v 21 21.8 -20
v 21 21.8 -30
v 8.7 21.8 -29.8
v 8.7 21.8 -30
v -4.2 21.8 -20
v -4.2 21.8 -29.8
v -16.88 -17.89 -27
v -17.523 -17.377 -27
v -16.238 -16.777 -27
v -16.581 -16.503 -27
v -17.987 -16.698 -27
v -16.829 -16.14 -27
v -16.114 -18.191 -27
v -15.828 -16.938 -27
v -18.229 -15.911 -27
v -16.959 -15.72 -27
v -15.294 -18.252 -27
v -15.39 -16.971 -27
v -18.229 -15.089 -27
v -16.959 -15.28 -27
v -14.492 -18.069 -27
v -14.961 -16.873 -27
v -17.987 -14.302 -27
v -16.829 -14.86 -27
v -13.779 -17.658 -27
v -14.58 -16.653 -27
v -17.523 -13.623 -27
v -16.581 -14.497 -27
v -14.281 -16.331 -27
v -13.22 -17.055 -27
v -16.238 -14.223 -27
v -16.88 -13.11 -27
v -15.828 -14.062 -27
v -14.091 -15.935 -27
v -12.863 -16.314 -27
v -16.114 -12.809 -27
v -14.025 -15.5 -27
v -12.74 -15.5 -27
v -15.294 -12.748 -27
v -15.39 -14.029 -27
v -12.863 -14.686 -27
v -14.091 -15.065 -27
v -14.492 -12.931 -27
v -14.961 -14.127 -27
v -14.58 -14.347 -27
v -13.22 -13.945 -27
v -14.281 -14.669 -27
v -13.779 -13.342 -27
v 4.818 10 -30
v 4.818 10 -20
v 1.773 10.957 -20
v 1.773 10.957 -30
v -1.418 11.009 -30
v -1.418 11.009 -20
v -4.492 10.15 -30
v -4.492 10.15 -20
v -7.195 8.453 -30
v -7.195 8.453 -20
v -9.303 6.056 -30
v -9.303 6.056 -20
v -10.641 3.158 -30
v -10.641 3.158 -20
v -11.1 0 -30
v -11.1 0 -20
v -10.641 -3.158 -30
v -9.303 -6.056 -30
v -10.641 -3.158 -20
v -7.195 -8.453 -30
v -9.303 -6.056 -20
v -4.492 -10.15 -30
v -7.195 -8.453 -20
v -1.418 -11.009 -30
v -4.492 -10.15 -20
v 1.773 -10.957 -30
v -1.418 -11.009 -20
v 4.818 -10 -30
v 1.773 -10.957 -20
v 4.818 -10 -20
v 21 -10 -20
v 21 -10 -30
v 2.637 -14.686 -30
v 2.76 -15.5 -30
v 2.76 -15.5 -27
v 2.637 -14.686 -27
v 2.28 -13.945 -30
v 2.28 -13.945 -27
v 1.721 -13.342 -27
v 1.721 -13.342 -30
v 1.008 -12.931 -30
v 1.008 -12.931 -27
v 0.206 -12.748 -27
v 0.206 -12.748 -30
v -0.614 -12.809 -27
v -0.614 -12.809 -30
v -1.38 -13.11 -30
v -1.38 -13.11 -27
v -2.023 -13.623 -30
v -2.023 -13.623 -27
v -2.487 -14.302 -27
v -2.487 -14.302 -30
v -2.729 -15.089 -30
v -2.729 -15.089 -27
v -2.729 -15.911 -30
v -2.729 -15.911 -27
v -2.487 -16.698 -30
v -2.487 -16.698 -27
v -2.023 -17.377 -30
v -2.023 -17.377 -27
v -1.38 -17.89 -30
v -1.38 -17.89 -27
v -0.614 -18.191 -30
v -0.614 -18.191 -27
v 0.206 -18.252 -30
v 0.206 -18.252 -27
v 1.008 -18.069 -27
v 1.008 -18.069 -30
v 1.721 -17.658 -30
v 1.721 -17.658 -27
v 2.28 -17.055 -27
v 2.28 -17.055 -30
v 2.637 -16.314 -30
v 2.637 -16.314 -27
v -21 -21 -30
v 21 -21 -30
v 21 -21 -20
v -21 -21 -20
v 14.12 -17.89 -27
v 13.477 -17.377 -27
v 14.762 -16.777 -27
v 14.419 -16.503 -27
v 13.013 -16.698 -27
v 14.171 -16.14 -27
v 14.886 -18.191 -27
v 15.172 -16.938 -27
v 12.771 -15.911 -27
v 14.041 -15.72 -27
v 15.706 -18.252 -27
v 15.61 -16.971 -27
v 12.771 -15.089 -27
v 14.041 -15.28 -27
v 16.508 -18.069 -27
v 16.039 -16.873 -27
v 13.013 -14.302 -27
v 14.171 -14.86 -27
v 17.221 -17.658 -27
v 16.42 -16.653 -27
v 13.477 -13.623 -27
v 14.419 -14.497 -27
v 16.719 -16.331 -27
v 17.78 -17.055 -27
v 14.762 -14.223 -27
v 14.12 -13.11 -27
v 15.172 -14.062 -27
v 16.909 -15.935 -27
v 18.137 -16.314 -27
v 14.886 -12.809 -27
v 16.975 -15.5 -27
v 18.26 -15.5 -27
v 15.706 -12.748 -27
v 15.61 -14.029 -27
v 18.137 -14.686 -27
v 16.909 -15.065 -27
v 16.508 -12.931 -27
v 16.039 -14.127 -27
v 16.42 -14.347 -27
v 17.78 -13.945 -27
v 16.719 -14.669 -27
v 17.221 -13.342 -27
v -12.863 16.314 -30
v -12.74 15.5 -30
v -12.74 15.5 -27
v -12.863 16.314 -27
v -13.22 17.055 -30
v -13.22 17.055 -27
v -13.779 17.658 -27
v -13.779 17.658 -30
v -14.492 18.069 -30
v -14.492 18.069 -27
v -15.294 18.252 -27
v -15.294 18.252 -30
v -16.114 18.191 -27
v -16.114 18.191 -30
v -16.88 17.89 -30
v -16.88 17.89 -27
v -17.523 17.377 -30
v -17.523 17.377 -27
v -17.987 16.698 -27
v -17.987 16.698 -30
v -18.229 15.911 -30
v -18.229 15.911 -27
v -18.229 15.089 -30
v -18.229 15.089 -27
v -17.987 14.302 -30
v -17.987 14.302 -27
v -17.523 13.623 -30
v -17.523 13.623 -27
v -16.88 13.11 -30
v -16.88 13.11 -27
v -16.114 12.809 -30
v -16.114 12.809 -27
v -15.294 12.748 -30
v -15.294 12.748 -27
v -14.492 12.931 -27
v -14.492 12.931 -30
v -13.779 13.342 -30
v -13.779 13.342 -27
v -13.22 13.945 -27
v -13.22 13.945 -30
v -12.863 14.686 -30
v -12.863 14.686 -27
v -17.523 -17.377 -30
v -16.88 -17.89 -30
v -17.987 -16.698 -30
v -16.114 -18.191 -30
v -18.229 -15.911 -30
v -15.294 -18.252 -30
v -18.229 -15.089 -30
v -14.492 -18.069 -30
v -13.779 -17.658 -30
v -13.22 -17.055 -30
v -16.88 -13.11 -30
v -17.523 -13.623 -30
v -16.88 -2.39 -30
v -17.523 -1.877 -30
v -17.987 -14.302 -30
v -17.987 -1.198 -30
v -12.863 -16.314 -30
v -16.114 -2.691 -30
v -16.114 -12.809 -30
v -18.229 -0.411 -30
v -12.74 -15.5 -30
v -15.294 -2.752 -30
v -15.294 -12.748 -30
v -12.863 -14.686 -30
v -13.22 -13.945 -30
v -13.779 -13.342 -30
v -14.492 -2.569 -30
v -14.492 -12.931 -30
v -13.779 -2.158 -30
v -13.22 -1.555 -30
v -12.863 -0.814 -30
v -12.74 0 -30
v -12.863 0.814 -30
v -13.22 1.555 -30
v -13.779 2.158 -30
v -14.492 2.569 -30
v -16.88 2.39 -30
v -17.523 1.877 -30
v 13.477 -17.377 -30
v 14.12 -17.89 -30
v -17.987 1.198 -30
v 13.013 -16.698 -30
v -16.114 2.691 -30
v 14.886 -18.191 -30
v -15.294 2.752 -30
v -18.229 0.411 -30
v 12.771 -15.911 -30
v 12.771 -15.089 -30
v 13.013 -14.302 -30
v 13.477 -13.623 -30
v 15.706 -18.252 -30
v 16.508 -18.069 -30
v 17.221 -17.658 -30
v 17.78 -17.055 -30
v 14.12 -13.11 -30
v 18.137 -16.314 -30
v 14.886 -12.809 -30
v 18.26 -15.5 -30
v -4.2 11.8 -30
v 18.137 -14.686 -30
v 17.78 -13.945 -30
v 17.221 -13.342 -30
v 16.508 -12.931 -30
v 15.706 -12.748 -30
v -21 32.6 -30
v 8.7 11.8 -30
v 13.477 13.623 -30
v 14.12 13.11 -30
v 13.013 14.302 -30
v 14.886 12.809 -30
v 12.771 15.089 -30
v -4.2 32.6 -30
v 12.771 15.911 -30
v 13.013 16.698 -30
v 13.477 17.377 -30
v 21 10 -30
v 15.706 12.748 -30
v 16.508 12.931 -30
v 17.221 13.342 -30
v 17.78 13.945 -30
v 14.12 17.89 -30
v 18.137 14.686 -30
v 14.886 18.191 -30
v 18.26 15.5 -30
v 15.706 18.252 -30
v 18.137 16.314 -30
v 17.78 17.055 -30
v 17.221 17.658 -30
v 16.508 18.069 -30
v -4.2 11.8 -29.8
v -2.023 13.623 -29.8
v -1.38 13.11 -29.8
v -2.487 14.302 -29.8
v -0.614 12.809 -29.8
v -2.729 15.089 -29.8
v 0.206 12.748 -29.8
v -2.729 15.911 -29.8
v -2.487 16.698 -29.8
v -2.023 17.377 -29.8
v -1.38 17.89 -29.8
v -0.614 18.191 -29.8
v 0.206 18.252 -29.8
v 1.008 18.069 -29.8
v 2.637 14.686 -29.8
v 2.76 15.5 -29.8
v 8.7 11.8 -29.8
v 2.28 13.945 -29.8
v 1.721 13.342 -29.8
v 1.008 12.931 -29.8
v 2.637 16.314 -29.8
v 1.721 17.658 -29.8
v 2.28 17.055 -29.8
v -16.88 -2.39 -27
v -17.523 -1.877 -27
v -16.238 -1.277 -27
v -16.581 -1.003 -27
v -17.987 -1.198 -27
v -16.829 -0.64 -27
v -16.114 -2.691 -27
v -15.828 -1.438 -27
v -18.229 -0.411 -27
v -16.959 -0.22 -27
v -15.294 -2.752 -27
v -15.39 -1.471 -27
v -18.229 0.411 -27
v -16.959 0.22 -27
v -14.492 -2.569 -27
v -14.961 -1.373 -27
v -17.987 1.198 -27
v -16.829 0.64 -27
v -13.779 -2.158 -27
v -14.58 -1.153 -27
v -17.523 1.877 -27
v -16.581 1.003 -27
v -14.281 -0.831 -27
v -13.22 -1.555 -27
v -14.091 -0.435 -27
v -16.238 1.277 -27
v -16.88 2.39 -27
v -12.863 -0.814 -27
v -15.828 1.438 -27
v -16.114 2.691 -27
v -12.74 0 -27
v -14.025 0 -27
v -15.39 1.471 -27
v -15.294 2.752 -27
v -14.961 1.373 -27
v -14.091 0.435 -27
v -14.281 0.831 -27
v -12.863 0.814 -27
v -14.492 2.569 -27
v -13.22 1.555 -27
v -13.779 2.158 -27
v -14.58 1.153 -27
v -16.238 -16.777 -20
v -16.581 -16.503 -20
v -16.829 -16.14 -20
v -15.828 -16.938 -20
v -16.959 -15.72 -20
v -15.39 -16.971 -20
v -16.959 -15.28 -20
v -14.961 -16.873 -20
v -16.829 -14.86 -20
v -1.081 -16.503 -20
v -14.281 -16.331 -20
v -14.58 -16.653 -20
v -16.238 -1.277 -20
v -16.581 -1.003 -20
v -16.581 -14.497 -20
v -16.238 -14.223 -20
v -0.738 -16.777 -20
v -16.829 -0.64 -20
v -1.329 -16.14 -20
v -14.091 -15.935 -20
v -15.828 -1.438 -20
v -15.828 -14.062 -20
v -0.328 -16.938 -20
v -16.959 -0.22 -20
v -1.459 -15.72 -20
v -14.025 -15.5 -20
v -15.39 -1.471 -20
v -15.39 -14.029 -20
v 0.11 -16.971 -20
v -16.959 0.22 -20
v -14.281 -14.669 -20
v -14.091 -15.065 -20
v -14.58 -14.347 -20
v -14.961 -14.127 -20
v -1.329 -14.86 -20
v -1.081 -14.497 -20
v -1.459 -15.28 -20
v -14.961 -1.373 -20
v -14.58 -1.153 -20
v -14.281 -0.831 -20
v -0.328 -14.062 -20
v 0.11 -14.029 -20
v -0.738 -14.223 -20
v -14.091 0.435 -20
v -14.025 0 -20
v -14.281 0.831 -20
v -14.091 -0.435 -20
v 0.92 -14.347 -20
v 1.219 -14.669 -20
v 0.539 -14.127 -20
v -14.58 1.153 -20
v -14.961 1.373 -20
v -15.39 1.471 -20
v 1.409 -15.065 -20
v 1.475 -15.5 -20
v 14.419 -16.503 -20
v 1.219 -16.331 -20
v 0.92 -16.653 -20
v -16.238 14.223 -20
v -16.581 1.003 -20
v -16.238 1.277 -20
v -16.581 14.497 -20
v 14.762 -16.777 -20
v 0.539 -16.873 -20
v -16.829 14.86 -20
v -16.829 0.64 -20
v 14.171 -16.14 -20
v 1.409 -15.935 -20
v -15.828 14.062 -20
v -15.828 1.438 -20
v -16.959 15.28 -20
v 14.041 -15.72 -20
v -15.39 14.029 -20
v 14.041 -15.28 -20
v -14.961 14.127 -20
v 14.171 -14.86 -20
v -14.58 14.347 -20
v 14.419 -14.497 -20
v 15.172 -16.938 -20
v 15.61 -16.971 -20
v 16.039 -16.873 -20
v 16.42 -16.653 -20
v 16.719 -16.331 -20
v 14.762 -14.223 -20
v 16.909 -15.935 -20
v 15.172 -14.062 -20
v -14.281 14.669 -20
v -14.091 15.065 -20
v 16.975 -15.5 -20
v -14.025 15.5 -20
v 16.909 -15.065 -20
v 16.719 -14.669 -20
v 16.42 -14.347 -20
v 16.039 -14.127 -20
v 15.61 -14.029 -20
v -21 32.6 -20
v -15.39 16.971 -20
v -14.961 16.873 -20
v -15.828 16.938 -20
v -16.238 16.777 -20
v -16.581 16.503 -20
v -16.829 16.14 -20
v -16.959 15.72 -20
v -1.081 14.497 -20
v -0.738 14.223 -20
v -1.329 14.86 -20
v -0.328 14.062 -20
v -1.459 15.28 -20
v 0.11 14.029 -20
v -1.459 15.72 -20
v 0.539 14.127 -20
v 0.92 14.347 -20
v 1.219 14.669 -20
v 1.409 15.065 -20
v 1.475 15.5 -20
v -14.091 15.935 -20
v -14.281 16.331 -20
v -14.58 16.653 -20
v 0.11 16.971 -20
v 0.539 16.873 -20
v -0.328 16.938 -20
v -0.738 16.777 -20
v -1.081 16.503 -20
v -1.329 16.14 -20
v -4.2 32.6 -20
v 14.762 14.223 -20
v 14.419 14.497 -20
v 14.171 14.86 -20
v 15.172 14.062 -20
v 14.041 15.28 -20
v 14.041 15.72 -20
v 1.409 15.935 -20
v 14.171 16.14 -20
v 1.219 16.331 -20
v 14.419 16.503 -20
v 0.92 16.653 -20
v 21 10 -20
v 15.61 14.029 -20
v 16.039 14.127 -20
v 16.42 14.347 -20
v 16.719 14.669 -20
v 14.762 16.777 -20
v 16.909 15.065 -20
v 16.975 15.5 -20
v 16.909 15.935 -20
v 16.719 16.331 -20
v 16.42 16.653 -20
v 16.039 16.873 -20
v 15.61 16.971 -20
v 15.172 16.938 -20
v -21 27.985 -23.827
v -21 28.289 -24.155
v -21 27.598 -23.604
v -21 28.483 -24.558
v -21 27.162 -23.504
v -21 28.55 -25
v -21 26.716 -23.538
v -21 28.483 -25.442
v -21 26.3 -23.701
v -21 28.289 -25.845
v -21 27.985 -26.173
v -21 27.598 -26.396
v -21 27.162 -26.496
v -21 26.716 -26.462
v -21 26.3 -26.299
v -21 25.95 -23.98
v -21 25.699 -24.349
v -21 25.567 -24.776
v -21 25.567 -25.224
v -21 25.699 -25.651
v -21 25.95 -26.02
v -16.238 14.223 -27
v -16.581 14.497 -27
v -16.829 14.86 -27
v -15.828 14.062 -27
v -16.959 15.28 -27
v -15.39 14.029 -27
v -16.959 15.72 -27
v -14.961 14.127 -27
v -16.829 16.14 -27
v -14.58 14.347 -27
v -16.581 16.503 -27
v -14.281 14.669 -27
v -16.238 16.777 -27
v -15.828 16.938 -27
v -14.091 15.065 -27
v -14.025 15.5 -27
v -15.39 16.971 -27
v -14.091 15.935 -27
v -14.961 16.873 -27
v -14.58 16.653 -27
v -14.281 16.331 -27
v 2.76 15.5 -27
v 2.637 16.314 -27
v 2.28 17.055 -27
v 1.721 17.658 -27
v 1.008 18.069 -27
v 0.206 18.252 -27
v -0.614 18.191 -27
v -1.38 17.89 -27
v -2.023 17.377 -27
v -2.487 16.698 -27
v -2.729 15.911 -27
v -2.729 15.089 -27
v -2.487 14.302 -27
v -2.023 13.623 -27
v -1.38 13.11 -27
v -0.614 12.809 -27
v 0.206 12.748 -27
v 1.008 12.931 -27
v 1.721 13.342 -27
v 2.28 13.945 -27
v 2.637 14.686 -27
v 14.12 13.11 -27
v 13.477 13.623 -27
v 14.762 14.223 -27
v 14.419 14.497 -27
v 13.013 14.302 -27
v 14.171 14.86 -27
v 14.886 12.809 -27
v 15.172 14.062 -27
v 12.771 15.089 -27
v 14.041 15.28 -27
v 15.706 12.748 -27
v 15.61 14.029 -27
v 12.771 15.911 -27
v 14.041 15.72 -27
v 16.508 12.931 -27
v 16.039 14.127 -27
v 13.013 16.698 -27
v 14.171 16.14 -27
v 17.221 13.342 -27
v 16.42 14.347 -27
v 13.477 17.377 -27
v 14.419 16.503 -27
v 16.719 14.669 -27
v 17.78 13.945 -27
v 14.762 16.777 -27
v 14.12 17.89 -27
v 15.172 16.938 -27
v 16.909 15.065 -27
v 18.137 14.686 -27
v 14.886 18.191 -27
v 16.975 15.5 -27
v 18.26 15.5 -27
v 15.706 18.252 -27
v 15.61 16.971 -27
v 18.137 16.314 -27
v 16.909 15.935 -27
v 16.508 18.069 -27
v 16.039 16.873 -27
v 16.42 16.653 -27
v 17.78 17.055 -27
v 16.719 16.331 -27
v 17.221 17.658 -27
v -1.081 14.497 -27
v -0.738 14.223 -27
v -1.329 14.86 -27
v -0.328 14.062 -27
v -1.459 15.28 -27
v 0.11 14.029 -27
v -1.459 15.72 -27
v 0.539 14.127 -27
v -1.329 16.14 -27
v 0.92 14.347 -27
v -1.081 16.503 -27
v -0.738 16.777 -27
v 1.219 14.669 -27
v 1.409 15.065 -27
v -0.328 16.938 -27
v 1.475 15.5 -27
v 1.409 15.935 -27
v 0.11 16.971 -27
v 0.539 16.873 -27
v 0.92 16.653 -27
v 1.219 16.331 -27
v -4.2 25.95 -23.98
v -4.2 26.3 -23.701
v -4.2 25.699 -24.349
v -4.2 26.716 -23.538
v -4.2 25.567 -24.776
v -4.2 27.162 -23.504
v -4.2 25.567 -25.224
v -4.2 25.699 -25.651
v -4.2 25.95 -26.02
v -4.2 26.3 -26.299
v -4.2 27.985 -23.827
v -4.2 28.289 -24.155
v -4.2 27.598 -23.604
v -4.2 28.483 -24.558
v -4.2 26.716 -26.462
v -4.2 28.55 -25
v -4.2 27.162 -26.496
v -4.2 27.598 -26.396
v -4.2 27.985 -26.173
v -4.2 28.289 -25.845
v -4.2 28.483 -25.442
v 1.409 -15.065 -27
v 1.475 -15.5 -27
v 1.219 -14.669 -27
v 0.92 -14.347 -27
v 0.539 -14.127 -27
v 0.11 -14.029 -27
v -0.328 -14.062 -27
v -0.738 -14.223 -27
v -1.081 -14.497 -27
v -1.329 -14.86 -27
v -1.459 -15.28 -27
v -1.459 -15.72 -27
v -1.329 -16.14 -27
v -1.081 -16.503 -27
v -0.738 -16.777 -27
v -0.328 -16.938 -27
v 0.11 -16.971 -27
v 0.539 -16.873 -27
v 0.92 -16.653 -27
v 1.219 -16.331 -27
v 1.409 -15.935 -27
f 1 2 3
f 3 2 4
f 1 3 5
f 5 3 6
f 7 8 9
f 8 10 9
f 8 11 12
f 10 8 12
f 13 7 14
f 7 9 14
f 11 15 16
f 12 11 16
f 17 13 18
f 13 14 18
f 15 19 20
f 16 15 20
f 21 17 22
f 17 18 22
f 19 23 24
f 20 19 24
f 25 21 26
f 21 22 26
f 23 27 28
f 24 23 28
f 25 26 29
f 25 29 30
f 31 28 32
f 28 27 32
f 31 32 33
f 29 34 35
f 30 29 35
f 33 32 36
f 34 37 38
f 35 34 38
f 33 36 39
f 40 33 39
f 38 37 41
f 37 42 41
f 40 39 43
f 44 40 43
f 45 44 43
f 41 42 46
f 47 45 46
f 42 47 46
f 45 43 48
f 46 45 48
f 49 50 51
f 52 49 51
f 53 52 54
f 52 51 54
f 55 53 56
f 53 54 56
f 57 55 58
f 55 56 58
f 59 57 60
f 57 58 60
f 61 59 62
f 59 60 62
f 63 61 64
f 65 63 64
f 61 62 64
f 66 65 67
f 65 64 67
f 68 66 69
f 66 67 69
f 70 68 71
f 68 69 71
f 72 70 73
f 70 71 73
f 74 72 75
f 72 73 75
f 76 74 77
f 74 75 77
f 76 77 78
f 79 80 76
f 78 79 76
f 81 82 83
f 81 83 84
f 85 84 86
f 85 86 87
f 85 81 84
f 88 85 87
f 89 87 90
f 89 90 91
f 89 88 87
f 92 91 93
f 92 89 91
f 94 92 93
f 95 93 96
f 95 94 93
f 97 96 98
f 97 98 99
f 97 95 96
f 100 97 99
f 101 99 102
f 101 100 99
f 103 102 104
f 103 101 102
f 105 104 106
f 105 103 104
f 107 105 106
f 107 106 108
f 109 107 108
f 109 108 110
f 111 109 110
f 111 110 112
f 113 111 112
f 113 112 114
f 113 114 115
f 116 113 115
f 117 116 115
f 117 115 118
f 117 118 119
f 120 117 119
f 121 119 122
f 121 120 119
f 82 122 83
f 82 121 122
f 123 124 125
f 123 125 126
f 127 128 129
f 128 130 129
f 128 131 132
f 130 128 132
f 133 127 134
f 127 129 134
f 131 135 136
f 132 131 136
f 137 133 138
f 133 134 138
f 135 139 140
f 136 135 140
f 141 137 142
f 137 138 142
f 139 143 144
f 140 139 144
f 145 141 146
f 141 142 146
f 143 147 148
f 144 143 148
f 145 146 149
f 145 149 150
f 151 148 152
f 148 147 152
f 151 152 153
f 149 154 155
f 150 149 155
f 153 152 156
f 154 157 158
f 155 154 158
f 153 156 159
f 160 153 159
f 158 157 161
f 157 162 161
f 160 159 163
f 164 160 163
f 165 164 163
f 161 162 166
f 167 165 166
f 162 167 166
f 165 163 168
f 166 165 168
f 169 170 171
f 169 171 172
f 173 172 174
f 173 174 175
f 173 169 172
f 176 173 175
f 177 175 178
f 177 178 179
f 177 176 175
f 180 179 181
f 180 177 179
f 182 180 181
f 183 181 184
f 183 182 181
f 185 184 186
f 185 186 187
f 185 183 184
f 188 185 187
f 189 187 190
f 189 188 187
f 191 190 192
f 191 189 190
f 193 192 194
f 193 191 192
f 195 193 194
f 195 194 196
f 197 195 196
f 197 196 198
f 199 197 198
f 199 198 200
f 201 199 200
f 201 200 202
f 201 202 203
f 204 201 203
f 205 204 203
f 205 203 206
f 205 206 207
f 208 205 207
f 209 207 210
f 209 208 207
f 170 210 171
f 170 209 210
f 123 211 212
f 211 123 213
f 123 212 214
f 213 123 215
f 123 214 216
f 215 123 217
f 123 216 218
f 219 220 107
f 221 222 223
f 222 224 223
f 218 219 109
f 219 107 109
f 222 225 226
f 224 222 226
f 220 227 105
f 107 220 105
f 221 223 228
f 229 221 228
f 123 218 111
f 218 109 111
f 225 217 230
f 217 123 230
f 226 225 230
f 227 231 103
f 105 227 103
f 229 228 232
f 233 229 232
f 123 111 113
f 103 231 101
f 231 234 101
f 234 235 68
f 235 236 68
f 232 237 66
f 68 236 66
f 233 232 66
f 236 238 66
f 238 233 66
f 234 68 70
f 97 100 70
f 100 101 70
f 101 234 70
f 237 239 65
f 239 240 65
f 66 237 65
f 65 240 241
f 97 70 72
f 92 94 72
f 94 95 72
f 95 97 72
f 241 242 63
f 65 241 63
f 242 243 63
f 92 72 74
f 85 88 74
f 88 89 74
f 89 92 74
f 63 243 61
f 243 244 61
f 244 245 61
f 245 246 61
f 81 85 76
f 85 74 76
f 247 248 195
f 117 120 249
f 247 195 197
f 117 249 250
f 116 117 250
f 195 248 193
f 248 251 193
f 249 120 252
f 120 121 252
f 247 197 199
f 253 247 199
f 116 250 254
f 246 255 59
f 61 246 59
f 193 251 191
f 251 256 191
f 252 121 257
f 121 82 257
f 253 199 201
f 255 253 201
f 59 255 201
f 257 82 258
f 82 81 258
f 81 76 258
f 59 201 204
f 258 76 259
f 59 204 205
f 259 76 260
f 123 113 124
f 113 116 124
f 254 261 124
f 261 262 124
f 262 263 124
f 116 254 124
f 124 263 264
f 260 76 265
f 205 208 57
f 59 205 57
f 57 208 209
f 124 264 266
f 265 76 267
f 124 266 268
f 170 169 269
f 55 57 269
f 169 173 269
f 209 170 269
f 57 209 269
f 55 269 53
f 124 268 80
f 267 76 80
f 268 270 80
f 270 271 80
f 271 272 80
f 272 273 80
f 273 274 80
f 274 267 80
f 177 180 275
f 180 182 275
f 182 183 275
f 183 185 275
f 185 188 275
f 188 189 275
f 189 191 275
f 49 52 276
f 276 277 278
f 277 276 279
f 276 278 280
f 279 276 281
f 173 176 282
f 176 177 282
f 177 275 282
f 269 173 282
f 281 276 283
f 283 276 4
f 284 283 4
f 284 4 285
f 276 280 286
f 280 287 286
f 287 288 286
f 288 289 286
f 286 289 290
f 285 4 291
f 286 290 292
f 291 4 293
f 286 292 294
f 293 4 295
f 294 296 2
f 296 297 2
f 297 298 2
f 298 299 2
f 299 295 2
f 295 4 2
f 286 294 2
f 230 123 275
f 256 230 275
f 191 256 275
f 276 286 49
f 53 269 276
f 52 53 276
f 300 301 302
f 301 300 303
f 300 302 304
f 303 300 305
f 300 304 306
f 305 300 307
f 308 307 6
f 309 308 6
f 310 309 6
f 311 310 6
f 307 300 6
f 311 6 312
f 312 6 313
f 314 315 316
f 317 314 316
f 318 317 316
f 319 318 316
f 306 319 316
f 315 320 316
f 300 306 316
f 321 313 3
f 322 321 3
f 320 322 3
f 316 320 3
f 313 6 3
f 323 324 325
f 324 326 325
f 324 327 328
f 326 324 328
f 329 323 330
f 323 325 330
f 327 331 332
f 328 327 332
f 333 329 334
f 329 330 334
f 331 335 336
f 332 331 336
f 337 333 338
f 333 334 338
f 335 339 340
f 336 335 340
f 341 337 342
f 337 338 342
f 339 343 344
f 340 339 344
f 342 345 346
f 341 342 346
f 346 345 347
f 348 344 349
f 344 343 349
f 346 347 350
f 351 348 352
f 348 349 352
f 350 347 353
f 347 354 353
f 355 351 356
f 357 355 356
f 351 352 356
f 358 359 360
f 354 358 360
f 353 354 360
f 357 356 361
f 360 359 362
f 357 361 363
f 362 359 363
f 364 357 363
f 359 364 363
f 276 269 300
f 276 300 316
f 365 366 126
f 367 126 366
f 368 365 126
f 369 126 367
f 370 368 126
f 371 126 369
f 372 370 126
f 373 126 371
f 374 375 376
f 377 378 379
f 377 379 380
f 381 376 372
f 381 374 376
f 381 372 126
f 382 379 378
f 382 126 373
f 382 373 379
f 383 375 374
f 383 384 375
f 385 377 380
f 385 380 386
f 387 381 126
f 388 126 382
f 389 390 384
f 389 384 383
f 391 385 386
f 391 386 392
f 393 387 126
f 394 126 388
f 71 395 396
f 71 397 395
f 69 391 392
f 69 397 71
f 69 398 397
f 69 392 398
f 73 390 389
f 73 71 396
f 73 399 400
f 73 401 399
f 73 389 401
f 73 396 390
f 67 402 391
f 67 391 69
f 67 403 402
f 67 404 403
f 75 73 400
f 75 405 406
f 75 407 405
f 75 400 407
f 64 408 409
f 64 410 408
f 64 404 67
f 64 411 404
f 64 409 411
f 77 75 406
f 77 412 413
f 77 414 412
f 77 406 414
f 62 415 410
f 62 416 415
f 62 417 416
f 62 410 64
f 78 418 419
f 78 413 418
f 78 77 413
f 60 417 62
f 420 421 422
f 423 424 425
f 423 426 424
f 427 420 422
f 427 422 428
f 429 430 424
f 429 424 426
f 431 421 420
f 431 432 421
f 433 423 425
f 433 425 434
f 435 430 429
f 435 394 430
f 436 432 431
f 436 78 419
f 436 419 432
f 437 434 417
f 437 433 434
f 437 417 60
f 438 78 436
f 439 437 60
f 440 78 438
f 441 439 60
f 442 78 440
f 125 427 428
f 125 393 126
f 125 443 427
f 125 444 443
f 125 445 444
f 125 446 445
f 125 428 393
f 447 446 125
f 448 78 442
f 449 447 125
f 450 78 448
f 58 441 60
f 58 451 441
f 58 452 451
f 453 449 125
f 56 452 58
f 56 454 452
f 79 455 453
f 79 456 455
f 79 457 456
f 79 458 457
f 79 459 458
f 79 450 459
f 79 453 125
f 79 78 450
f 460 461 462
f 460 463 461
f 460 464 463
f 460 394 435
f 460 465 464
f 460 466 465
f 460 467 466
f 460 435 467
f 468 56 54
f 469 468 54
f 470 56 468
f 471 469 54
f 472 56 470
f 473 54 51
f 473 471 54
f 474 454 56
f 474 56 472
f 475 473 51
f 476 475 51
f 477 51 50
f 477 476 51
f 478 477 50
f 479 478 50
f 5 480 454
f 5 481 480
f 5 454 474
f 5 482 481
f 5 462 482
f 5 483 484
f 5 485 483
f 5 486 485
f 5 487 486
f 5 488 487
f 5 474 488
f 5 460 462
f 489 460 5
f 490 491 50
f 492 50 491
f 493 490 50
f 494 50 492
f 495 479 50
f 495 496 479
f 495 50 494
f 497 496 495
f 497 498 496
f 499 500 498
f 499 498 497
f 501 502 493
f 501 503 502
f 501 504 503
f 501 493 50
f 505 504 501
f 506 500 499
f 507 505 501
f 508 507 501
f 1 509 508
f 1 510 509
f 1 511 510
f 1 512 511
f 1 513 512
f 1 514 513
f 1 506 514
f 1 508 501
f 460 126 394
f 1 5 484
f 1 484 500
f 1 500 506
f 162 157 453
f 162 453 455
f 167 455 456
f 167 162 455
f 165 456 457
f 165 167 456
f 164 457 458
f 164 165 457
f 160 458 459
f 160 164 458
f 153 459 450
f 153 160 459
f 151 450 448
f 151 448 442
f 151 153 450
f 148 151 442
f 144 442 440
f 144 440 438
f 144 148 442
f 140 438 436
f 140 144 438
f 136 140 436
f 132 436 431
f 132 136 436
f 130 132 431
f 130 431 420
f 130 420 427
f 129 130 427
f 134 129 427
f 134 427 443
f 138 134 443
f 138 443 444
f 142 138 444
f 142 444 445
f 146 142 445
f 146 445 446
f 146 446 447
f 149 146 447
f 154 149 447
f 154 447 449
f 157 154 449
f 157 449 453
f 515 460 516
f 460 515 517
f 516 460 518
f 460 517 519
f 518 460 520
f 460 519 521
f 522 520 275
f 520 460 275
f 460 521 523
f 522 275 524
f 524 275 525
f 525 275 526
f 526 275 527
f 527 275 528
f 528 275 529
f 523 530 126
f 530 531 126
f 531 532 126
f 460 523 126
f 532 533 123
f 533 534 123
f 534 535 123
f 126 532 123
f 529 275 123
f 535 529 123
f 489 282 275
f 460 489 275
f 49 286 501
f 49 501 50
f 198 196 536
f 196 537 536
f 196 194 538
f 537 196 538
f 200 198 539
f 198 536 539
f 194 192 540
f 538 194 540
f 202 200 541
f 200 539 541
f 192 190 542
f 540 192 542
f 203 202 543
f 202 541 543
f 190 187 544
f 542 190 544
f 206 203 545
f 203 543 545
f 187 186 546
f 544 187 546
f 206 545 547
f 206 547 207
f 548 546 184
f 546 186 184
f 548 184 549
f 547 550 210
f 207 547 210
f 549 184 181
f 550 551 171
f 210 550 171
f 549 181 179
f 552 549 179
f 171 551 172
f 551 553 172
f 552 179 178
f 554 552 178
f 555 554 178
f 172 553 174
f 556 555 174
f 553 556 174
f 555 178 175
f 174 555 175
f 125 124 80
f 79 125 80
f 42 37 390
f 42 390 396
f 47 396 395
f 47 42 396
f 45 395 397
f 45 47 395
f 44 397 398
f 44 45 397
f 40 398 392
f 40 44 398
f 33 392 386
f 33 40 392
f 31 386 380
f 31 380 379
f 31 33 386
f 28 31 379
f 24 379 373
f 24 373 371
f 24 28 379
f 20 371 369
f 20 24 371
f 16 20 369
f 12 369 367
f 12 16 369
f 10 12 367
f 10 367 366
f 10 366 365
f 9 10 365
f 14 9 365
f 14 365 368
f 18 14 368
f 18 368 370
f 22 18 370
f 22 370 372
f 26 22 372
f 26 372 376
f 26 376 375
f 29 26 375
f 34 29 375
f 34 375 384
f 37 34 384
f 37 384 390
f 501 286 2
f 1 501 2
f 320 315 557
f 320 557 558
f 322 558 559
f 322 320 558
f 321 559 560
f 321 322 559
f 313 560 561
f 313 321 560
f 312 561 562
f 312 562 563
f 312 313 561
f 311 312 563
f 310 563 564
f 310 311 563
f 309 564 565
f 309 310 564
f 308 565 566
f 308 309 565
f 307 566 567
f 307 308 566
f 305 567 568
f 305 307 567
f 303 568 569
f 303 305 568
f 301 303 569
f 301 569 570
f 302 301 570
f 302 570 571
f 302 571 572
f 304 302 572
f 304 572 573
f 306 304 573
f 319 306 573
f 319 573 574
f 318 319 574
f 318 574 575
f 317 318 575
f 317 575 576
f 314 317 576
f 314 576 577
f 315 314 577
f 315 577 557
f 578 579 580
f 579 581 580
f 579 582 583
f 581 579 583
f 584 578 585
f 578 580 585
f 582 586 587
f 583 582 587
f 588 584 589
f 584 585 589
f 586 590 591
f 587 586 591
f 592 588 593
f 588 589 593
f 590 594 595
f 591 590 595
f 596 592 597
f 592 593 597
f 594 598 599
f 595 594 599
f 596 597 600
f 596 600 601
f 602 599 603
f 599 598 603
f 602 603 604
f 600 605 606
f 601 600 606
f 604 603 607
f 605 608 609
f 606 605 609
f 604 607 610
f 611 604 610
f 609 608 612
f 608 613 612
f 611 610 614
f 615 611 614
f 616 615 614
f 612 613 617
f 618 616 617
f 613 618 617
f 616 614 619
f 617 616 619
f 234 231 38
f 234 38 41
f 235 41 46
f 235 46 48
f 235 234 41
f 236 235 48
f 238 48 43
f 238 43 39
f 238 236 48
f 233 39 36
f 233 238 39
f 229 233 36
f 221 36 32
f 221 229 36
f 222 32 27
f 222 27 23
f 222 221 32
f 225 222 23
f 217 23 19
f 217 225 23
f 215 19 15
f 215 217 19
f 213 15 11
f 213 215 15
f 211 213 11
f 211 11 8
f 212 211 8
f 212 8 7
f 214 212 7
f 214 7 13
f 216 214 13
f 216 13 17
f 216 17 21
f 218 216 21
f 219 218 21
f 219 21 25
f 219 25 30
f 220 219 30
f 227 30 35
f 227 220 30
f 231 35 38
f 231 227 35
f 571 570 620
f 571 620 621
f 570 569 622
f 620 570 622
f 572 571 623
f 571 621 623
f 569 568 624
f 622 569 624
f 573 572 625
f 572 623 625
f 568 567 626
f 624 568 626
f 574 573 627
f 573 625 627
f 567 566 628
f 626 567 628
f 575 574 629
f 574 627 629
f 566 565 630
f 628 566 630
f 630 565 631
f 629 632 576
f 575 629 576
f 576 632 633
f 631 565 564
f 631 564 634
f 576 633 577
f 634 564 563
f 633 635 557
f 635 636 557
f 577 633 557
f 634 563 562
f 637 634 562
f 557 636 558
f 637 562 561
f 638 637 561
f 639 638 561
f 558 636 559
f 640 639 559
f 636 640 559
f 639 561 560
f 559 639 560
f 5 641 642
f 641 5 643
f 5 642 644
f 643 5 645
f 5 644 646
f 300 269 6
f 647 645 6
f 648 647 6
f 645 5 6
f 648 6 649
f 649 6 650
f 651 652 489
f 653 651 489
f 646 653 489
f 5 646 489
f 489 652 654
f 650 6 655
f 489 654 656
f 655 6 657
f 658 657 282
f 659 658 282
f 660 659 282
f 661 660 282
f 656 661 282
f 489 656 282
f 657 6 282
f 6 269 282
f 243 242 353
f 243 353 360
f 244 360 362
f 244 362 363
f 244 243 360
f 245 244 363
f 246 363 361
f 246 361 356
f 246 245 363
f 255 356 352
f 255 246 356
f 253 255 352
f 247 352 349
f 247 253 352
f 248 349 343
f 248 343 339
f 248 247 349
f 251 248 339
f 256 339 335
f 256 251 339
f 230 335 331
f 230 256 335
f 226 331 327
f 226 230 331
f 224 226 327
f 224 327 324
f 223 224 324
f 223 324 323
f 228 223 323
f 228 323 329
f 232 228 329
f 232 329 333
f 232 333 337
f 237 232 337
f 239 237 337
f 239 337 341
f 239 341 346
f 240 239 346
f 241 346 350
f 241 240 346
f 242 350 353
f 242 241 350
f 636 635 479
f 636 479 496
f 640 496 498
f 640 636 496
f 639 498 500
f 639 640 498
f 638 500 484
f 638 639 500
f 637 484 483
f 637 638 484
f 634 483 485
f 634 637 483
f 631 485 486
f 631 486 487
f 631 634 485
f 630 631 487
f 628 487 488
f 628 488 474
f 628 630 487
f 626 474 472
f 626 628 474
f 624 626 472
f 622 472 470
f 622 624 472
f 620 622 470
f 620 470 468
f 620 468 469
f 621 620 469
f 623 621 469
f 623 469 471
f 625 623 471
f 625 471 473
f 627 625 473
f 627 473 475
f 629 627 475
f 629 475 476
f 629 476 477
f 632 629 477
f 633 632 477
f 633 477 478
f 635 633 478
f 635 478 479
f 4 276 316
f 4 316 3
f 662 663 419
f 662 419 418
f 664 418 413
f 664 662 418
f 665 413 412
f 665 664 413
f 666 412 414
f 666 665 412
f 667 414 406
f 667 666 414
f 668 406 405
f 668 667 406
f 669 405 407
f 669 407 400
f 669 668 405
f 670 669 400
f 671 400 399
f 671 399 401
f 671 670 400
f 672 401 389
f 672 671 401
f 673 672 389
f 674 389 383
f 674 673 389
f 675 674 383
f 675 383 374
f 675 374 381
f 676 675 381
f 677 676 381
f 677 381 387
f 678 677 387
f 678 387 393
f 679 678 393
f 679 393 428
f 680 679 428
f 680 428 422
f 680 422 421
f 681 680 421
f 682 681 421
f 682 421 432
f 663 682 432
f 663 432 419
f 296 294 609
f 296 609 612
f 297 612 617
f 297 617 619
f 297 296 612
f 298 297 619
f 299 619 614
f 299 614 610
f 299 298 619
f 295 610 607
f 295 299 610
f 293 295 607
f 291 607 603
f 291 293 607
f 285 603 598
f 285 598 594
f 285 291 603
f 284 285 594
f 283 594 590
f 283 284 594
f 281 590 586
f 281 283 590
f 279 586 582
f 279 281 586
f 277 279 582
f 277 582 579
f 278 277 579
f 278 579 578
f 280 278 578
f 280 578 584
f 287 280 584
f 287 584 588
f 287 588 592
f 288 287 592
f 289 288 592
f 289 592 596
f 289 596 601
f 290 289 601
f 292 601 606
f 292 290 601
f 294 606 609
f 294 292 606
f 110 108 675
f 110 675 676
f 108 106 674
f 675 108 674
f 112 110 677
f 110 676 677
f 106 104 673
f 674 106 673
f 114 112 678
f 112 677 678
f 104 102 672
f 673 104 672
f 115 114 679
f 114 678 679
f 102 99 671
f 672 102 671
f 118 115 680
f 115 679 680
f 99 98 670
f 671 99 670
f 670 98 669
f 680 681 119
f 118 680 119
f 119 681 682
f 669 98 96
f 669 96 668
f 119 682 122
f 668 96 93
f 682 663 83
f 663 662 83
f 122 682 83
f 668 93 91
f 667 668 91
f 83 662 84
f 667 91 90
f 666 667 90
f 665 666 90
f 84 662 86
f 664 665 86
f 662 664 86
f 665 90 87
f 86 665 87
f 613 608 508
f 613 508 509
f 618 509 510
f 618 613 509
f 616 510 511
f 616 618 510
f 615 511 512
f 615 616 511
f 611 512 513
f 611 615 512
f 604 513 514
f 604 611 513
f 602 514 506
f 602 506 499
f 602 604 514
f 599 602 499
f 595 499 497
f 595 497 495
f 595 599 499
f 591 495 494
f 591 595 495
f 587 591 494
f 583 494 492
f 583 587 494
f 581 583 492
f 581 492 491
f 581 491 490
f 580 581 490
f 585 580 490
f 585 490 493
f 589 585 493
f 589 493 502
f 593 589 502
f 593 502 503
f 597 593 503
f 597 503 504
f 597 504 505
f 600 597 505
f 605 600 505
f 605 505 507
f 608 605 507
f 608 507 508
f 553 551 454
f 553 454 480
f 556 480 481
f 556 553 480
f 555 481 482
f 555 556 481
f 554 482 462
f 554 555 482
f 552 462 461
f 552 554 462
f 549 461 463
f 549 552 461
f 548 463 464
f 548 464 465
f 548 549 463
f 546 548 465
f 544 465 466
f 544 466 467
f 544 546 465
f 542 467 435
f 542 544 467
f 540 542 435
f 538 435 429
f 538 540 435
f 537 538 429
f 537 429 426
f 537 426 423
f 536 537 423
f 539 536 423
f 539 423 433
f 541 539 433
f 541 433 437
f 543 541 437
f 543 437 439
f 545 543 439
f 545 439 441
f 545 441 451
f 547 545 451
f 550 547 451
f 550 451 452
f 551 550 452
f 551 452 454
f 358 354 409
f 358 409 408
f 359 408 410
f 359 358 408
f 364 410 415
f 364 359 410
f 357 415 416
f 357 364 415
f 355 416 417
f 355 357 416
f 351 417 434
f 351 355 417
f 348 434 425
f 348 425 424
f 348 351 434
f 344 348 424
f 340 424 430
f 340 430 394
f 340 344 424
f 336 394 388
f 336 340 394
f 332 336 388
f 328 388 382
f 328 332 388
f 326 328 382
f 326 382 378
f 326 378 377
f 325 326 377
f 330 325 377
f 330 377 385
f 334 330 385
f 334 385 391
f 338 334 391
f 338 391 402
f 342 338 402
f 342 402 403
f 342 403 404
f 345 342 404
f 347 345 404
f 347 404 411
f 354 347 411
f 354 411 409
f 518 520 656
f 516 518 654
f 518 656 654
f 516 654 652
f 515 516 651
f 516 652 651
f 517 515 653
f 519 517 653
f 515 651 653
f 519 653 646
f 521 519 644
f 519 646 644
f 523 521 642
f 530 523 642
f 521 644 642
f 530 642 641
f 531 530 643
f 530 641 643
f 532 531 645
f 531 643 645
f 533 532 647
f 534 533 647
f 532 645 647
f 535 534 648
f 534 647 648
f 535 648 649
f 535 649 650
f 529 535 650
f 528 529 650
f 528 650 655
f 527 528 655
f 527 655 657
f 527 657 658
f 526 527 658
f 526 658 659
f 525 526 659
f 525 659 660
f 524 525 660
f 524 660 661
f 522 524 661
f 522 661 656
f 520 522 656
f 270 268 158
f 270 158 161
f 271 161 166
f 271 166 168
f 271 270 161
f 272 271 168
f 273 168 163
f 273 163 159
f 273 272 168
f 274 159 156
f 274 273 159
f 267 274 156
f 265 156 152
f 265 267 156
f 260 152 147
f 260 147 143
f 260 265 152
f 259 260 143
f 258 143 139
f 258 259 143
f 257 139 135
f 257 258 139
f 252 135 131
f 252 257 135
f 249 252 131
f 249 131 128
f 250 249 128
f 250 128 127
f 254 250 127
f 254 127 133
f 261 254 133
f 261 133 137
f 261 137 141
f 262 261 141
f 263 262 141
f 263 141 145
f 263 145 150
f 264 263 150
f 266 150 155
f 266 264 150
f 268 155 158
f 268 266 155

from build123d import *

# Parameters (mm, degrees)
SKETCH054_R          = 1.475
PAD016_DEPTH         = 10
SKETCH055_R          = 2.76
POCKET034_DEPTH      = 3
SKETCH056_R          = 11.1
POCKET035_DEPTH      = 10.001
POCKET035_DEPTH_BACK = 0.001
PAD017_DEPTH         = 10
SKETCH058_R          = 1.5
POCKET036_DEPTH      = 21.001
SKETCH059_W          = 12.9
SKETCH059_H          = 10.2
POCKET037_DEPTH      = 0.2


with BuildPart() as part:
    # Sketch054 → Pad016 (new body)
    with BuildSketch(Plane.XY):
        with BuildLine():
            Line((-21, 21), (21, 21))
            Line((21, 21), (21, 10))
            Line((21, 10), (0, 10))
            ThreePointArc((0, 10), (-10, 0), (0, -10))
            Line((21, -10), (0, -10))
            Line((21, -21), (21, -10))
            Line((21, -21), (-21, -21))
            Line((-21, -21), (-21, 21))
        make_face()
        with Locations((-15.5, 15.5)):
            Circle(SKETCH054_R, mode=Mode.SUBTRACT)
        with Locations((15.5, 15.5)):
            Circle(SKETCH054_R, mode=Mode.SUBTRACT)
        with Locations((-15.5, -15.5)):
            Circle(SKETCH054_R, mode=Mode.SUBTRACT)
        with Locations((15.5, -15.5)):
            Circle(SKETCH054_R, mode=Mode.SUBTRACT)
        with Locations((-15.5, 0)):
            Circle(SKETCH054_R, mode=Mode.SUBTRACT)
        with Locations((0, 15.5)):
            Circle(SKETCH054_R, mode=Mode.SUBTRACT)
        with Locations((0, -15.5)):
            Circle(SKETCH054_R, mode=Mode.SUBTRACT)
    extrude(amount=PAD016_DEPTH)

    # Sketch055 → Pocket034 (cut)
    with BuildSketch(Plane.XY):
        with Locations((-15.5, 15.5)):
            Circle(SKETCH055_R)
        with Locations((15.5, 15.5)):
            Circle(SKETCH055_R)
        with Locations((-15.5, -15.5)):
            Circle(SKETCH055_R)
        with Locations((15.5, -15.5)):
            Circle(SKETCH055_R)
        with Locations((-15.5, 0)):
            Circle(SKETCH055_R)
        with Locations((0, 15.5)):
            Circle(SKETCH055_R)
        with Locations((0, -15.5)):
            Circle(SKETCH055_R)
    extrude(amount=POCKET034_DEPTH, mode=Mode.SUBTRACT)

    # Sketch056 (on Face5 of Pocket034) → Pocket035 (cut, two sides)
    with BuildSketch(Plane.XY.offset(10)) as pocket035_sk:
        Circle(SKETCH056_R)
    extrude(amount=-POCKET035_DEPTH, mode=Mode.SUBTRACT)
    extrude(pocket035_sk.sketch, amount=POCKET035_DEPTH_BACK, mode=Mode.SUBTRACT)

    # Sketch057 → Pad017 (join)
    with BuildSketch(Plane.XY):
        Polygon((-4.2, 21.8), (-4.2, 32.6), (-21, 32.6), (-21, 21), (21, 21), (21, 21.8), align=None)
    extrude(amount=PAD017_DEPTH)

    # Sketch058 → Pocket036 (cut, through all)
    with BuildSketch(Plane.YZ):
        with Locations((27.05, 5)):
            Circle(SKETCH058_R)
    extrude(amount=-POCKET036_DEPTH, mode=Mode.SUBTRACT)

    # Sketch059 → Pocket037 (cut)
    with BuildSketch(Plane.XY):
        with Locations((2.25, 16.9)):
            Rectangle(SKETCH059_W, SKETCH059_H)
    extrude(amount=POCKET037_DEPTH, mode=Mode.SUBTRACT)


with BuildPart() as part_1:
    # Body011 placement: moved
    add(part.part.moved(Location((0, 0, -30))))


solid = part_1.part
